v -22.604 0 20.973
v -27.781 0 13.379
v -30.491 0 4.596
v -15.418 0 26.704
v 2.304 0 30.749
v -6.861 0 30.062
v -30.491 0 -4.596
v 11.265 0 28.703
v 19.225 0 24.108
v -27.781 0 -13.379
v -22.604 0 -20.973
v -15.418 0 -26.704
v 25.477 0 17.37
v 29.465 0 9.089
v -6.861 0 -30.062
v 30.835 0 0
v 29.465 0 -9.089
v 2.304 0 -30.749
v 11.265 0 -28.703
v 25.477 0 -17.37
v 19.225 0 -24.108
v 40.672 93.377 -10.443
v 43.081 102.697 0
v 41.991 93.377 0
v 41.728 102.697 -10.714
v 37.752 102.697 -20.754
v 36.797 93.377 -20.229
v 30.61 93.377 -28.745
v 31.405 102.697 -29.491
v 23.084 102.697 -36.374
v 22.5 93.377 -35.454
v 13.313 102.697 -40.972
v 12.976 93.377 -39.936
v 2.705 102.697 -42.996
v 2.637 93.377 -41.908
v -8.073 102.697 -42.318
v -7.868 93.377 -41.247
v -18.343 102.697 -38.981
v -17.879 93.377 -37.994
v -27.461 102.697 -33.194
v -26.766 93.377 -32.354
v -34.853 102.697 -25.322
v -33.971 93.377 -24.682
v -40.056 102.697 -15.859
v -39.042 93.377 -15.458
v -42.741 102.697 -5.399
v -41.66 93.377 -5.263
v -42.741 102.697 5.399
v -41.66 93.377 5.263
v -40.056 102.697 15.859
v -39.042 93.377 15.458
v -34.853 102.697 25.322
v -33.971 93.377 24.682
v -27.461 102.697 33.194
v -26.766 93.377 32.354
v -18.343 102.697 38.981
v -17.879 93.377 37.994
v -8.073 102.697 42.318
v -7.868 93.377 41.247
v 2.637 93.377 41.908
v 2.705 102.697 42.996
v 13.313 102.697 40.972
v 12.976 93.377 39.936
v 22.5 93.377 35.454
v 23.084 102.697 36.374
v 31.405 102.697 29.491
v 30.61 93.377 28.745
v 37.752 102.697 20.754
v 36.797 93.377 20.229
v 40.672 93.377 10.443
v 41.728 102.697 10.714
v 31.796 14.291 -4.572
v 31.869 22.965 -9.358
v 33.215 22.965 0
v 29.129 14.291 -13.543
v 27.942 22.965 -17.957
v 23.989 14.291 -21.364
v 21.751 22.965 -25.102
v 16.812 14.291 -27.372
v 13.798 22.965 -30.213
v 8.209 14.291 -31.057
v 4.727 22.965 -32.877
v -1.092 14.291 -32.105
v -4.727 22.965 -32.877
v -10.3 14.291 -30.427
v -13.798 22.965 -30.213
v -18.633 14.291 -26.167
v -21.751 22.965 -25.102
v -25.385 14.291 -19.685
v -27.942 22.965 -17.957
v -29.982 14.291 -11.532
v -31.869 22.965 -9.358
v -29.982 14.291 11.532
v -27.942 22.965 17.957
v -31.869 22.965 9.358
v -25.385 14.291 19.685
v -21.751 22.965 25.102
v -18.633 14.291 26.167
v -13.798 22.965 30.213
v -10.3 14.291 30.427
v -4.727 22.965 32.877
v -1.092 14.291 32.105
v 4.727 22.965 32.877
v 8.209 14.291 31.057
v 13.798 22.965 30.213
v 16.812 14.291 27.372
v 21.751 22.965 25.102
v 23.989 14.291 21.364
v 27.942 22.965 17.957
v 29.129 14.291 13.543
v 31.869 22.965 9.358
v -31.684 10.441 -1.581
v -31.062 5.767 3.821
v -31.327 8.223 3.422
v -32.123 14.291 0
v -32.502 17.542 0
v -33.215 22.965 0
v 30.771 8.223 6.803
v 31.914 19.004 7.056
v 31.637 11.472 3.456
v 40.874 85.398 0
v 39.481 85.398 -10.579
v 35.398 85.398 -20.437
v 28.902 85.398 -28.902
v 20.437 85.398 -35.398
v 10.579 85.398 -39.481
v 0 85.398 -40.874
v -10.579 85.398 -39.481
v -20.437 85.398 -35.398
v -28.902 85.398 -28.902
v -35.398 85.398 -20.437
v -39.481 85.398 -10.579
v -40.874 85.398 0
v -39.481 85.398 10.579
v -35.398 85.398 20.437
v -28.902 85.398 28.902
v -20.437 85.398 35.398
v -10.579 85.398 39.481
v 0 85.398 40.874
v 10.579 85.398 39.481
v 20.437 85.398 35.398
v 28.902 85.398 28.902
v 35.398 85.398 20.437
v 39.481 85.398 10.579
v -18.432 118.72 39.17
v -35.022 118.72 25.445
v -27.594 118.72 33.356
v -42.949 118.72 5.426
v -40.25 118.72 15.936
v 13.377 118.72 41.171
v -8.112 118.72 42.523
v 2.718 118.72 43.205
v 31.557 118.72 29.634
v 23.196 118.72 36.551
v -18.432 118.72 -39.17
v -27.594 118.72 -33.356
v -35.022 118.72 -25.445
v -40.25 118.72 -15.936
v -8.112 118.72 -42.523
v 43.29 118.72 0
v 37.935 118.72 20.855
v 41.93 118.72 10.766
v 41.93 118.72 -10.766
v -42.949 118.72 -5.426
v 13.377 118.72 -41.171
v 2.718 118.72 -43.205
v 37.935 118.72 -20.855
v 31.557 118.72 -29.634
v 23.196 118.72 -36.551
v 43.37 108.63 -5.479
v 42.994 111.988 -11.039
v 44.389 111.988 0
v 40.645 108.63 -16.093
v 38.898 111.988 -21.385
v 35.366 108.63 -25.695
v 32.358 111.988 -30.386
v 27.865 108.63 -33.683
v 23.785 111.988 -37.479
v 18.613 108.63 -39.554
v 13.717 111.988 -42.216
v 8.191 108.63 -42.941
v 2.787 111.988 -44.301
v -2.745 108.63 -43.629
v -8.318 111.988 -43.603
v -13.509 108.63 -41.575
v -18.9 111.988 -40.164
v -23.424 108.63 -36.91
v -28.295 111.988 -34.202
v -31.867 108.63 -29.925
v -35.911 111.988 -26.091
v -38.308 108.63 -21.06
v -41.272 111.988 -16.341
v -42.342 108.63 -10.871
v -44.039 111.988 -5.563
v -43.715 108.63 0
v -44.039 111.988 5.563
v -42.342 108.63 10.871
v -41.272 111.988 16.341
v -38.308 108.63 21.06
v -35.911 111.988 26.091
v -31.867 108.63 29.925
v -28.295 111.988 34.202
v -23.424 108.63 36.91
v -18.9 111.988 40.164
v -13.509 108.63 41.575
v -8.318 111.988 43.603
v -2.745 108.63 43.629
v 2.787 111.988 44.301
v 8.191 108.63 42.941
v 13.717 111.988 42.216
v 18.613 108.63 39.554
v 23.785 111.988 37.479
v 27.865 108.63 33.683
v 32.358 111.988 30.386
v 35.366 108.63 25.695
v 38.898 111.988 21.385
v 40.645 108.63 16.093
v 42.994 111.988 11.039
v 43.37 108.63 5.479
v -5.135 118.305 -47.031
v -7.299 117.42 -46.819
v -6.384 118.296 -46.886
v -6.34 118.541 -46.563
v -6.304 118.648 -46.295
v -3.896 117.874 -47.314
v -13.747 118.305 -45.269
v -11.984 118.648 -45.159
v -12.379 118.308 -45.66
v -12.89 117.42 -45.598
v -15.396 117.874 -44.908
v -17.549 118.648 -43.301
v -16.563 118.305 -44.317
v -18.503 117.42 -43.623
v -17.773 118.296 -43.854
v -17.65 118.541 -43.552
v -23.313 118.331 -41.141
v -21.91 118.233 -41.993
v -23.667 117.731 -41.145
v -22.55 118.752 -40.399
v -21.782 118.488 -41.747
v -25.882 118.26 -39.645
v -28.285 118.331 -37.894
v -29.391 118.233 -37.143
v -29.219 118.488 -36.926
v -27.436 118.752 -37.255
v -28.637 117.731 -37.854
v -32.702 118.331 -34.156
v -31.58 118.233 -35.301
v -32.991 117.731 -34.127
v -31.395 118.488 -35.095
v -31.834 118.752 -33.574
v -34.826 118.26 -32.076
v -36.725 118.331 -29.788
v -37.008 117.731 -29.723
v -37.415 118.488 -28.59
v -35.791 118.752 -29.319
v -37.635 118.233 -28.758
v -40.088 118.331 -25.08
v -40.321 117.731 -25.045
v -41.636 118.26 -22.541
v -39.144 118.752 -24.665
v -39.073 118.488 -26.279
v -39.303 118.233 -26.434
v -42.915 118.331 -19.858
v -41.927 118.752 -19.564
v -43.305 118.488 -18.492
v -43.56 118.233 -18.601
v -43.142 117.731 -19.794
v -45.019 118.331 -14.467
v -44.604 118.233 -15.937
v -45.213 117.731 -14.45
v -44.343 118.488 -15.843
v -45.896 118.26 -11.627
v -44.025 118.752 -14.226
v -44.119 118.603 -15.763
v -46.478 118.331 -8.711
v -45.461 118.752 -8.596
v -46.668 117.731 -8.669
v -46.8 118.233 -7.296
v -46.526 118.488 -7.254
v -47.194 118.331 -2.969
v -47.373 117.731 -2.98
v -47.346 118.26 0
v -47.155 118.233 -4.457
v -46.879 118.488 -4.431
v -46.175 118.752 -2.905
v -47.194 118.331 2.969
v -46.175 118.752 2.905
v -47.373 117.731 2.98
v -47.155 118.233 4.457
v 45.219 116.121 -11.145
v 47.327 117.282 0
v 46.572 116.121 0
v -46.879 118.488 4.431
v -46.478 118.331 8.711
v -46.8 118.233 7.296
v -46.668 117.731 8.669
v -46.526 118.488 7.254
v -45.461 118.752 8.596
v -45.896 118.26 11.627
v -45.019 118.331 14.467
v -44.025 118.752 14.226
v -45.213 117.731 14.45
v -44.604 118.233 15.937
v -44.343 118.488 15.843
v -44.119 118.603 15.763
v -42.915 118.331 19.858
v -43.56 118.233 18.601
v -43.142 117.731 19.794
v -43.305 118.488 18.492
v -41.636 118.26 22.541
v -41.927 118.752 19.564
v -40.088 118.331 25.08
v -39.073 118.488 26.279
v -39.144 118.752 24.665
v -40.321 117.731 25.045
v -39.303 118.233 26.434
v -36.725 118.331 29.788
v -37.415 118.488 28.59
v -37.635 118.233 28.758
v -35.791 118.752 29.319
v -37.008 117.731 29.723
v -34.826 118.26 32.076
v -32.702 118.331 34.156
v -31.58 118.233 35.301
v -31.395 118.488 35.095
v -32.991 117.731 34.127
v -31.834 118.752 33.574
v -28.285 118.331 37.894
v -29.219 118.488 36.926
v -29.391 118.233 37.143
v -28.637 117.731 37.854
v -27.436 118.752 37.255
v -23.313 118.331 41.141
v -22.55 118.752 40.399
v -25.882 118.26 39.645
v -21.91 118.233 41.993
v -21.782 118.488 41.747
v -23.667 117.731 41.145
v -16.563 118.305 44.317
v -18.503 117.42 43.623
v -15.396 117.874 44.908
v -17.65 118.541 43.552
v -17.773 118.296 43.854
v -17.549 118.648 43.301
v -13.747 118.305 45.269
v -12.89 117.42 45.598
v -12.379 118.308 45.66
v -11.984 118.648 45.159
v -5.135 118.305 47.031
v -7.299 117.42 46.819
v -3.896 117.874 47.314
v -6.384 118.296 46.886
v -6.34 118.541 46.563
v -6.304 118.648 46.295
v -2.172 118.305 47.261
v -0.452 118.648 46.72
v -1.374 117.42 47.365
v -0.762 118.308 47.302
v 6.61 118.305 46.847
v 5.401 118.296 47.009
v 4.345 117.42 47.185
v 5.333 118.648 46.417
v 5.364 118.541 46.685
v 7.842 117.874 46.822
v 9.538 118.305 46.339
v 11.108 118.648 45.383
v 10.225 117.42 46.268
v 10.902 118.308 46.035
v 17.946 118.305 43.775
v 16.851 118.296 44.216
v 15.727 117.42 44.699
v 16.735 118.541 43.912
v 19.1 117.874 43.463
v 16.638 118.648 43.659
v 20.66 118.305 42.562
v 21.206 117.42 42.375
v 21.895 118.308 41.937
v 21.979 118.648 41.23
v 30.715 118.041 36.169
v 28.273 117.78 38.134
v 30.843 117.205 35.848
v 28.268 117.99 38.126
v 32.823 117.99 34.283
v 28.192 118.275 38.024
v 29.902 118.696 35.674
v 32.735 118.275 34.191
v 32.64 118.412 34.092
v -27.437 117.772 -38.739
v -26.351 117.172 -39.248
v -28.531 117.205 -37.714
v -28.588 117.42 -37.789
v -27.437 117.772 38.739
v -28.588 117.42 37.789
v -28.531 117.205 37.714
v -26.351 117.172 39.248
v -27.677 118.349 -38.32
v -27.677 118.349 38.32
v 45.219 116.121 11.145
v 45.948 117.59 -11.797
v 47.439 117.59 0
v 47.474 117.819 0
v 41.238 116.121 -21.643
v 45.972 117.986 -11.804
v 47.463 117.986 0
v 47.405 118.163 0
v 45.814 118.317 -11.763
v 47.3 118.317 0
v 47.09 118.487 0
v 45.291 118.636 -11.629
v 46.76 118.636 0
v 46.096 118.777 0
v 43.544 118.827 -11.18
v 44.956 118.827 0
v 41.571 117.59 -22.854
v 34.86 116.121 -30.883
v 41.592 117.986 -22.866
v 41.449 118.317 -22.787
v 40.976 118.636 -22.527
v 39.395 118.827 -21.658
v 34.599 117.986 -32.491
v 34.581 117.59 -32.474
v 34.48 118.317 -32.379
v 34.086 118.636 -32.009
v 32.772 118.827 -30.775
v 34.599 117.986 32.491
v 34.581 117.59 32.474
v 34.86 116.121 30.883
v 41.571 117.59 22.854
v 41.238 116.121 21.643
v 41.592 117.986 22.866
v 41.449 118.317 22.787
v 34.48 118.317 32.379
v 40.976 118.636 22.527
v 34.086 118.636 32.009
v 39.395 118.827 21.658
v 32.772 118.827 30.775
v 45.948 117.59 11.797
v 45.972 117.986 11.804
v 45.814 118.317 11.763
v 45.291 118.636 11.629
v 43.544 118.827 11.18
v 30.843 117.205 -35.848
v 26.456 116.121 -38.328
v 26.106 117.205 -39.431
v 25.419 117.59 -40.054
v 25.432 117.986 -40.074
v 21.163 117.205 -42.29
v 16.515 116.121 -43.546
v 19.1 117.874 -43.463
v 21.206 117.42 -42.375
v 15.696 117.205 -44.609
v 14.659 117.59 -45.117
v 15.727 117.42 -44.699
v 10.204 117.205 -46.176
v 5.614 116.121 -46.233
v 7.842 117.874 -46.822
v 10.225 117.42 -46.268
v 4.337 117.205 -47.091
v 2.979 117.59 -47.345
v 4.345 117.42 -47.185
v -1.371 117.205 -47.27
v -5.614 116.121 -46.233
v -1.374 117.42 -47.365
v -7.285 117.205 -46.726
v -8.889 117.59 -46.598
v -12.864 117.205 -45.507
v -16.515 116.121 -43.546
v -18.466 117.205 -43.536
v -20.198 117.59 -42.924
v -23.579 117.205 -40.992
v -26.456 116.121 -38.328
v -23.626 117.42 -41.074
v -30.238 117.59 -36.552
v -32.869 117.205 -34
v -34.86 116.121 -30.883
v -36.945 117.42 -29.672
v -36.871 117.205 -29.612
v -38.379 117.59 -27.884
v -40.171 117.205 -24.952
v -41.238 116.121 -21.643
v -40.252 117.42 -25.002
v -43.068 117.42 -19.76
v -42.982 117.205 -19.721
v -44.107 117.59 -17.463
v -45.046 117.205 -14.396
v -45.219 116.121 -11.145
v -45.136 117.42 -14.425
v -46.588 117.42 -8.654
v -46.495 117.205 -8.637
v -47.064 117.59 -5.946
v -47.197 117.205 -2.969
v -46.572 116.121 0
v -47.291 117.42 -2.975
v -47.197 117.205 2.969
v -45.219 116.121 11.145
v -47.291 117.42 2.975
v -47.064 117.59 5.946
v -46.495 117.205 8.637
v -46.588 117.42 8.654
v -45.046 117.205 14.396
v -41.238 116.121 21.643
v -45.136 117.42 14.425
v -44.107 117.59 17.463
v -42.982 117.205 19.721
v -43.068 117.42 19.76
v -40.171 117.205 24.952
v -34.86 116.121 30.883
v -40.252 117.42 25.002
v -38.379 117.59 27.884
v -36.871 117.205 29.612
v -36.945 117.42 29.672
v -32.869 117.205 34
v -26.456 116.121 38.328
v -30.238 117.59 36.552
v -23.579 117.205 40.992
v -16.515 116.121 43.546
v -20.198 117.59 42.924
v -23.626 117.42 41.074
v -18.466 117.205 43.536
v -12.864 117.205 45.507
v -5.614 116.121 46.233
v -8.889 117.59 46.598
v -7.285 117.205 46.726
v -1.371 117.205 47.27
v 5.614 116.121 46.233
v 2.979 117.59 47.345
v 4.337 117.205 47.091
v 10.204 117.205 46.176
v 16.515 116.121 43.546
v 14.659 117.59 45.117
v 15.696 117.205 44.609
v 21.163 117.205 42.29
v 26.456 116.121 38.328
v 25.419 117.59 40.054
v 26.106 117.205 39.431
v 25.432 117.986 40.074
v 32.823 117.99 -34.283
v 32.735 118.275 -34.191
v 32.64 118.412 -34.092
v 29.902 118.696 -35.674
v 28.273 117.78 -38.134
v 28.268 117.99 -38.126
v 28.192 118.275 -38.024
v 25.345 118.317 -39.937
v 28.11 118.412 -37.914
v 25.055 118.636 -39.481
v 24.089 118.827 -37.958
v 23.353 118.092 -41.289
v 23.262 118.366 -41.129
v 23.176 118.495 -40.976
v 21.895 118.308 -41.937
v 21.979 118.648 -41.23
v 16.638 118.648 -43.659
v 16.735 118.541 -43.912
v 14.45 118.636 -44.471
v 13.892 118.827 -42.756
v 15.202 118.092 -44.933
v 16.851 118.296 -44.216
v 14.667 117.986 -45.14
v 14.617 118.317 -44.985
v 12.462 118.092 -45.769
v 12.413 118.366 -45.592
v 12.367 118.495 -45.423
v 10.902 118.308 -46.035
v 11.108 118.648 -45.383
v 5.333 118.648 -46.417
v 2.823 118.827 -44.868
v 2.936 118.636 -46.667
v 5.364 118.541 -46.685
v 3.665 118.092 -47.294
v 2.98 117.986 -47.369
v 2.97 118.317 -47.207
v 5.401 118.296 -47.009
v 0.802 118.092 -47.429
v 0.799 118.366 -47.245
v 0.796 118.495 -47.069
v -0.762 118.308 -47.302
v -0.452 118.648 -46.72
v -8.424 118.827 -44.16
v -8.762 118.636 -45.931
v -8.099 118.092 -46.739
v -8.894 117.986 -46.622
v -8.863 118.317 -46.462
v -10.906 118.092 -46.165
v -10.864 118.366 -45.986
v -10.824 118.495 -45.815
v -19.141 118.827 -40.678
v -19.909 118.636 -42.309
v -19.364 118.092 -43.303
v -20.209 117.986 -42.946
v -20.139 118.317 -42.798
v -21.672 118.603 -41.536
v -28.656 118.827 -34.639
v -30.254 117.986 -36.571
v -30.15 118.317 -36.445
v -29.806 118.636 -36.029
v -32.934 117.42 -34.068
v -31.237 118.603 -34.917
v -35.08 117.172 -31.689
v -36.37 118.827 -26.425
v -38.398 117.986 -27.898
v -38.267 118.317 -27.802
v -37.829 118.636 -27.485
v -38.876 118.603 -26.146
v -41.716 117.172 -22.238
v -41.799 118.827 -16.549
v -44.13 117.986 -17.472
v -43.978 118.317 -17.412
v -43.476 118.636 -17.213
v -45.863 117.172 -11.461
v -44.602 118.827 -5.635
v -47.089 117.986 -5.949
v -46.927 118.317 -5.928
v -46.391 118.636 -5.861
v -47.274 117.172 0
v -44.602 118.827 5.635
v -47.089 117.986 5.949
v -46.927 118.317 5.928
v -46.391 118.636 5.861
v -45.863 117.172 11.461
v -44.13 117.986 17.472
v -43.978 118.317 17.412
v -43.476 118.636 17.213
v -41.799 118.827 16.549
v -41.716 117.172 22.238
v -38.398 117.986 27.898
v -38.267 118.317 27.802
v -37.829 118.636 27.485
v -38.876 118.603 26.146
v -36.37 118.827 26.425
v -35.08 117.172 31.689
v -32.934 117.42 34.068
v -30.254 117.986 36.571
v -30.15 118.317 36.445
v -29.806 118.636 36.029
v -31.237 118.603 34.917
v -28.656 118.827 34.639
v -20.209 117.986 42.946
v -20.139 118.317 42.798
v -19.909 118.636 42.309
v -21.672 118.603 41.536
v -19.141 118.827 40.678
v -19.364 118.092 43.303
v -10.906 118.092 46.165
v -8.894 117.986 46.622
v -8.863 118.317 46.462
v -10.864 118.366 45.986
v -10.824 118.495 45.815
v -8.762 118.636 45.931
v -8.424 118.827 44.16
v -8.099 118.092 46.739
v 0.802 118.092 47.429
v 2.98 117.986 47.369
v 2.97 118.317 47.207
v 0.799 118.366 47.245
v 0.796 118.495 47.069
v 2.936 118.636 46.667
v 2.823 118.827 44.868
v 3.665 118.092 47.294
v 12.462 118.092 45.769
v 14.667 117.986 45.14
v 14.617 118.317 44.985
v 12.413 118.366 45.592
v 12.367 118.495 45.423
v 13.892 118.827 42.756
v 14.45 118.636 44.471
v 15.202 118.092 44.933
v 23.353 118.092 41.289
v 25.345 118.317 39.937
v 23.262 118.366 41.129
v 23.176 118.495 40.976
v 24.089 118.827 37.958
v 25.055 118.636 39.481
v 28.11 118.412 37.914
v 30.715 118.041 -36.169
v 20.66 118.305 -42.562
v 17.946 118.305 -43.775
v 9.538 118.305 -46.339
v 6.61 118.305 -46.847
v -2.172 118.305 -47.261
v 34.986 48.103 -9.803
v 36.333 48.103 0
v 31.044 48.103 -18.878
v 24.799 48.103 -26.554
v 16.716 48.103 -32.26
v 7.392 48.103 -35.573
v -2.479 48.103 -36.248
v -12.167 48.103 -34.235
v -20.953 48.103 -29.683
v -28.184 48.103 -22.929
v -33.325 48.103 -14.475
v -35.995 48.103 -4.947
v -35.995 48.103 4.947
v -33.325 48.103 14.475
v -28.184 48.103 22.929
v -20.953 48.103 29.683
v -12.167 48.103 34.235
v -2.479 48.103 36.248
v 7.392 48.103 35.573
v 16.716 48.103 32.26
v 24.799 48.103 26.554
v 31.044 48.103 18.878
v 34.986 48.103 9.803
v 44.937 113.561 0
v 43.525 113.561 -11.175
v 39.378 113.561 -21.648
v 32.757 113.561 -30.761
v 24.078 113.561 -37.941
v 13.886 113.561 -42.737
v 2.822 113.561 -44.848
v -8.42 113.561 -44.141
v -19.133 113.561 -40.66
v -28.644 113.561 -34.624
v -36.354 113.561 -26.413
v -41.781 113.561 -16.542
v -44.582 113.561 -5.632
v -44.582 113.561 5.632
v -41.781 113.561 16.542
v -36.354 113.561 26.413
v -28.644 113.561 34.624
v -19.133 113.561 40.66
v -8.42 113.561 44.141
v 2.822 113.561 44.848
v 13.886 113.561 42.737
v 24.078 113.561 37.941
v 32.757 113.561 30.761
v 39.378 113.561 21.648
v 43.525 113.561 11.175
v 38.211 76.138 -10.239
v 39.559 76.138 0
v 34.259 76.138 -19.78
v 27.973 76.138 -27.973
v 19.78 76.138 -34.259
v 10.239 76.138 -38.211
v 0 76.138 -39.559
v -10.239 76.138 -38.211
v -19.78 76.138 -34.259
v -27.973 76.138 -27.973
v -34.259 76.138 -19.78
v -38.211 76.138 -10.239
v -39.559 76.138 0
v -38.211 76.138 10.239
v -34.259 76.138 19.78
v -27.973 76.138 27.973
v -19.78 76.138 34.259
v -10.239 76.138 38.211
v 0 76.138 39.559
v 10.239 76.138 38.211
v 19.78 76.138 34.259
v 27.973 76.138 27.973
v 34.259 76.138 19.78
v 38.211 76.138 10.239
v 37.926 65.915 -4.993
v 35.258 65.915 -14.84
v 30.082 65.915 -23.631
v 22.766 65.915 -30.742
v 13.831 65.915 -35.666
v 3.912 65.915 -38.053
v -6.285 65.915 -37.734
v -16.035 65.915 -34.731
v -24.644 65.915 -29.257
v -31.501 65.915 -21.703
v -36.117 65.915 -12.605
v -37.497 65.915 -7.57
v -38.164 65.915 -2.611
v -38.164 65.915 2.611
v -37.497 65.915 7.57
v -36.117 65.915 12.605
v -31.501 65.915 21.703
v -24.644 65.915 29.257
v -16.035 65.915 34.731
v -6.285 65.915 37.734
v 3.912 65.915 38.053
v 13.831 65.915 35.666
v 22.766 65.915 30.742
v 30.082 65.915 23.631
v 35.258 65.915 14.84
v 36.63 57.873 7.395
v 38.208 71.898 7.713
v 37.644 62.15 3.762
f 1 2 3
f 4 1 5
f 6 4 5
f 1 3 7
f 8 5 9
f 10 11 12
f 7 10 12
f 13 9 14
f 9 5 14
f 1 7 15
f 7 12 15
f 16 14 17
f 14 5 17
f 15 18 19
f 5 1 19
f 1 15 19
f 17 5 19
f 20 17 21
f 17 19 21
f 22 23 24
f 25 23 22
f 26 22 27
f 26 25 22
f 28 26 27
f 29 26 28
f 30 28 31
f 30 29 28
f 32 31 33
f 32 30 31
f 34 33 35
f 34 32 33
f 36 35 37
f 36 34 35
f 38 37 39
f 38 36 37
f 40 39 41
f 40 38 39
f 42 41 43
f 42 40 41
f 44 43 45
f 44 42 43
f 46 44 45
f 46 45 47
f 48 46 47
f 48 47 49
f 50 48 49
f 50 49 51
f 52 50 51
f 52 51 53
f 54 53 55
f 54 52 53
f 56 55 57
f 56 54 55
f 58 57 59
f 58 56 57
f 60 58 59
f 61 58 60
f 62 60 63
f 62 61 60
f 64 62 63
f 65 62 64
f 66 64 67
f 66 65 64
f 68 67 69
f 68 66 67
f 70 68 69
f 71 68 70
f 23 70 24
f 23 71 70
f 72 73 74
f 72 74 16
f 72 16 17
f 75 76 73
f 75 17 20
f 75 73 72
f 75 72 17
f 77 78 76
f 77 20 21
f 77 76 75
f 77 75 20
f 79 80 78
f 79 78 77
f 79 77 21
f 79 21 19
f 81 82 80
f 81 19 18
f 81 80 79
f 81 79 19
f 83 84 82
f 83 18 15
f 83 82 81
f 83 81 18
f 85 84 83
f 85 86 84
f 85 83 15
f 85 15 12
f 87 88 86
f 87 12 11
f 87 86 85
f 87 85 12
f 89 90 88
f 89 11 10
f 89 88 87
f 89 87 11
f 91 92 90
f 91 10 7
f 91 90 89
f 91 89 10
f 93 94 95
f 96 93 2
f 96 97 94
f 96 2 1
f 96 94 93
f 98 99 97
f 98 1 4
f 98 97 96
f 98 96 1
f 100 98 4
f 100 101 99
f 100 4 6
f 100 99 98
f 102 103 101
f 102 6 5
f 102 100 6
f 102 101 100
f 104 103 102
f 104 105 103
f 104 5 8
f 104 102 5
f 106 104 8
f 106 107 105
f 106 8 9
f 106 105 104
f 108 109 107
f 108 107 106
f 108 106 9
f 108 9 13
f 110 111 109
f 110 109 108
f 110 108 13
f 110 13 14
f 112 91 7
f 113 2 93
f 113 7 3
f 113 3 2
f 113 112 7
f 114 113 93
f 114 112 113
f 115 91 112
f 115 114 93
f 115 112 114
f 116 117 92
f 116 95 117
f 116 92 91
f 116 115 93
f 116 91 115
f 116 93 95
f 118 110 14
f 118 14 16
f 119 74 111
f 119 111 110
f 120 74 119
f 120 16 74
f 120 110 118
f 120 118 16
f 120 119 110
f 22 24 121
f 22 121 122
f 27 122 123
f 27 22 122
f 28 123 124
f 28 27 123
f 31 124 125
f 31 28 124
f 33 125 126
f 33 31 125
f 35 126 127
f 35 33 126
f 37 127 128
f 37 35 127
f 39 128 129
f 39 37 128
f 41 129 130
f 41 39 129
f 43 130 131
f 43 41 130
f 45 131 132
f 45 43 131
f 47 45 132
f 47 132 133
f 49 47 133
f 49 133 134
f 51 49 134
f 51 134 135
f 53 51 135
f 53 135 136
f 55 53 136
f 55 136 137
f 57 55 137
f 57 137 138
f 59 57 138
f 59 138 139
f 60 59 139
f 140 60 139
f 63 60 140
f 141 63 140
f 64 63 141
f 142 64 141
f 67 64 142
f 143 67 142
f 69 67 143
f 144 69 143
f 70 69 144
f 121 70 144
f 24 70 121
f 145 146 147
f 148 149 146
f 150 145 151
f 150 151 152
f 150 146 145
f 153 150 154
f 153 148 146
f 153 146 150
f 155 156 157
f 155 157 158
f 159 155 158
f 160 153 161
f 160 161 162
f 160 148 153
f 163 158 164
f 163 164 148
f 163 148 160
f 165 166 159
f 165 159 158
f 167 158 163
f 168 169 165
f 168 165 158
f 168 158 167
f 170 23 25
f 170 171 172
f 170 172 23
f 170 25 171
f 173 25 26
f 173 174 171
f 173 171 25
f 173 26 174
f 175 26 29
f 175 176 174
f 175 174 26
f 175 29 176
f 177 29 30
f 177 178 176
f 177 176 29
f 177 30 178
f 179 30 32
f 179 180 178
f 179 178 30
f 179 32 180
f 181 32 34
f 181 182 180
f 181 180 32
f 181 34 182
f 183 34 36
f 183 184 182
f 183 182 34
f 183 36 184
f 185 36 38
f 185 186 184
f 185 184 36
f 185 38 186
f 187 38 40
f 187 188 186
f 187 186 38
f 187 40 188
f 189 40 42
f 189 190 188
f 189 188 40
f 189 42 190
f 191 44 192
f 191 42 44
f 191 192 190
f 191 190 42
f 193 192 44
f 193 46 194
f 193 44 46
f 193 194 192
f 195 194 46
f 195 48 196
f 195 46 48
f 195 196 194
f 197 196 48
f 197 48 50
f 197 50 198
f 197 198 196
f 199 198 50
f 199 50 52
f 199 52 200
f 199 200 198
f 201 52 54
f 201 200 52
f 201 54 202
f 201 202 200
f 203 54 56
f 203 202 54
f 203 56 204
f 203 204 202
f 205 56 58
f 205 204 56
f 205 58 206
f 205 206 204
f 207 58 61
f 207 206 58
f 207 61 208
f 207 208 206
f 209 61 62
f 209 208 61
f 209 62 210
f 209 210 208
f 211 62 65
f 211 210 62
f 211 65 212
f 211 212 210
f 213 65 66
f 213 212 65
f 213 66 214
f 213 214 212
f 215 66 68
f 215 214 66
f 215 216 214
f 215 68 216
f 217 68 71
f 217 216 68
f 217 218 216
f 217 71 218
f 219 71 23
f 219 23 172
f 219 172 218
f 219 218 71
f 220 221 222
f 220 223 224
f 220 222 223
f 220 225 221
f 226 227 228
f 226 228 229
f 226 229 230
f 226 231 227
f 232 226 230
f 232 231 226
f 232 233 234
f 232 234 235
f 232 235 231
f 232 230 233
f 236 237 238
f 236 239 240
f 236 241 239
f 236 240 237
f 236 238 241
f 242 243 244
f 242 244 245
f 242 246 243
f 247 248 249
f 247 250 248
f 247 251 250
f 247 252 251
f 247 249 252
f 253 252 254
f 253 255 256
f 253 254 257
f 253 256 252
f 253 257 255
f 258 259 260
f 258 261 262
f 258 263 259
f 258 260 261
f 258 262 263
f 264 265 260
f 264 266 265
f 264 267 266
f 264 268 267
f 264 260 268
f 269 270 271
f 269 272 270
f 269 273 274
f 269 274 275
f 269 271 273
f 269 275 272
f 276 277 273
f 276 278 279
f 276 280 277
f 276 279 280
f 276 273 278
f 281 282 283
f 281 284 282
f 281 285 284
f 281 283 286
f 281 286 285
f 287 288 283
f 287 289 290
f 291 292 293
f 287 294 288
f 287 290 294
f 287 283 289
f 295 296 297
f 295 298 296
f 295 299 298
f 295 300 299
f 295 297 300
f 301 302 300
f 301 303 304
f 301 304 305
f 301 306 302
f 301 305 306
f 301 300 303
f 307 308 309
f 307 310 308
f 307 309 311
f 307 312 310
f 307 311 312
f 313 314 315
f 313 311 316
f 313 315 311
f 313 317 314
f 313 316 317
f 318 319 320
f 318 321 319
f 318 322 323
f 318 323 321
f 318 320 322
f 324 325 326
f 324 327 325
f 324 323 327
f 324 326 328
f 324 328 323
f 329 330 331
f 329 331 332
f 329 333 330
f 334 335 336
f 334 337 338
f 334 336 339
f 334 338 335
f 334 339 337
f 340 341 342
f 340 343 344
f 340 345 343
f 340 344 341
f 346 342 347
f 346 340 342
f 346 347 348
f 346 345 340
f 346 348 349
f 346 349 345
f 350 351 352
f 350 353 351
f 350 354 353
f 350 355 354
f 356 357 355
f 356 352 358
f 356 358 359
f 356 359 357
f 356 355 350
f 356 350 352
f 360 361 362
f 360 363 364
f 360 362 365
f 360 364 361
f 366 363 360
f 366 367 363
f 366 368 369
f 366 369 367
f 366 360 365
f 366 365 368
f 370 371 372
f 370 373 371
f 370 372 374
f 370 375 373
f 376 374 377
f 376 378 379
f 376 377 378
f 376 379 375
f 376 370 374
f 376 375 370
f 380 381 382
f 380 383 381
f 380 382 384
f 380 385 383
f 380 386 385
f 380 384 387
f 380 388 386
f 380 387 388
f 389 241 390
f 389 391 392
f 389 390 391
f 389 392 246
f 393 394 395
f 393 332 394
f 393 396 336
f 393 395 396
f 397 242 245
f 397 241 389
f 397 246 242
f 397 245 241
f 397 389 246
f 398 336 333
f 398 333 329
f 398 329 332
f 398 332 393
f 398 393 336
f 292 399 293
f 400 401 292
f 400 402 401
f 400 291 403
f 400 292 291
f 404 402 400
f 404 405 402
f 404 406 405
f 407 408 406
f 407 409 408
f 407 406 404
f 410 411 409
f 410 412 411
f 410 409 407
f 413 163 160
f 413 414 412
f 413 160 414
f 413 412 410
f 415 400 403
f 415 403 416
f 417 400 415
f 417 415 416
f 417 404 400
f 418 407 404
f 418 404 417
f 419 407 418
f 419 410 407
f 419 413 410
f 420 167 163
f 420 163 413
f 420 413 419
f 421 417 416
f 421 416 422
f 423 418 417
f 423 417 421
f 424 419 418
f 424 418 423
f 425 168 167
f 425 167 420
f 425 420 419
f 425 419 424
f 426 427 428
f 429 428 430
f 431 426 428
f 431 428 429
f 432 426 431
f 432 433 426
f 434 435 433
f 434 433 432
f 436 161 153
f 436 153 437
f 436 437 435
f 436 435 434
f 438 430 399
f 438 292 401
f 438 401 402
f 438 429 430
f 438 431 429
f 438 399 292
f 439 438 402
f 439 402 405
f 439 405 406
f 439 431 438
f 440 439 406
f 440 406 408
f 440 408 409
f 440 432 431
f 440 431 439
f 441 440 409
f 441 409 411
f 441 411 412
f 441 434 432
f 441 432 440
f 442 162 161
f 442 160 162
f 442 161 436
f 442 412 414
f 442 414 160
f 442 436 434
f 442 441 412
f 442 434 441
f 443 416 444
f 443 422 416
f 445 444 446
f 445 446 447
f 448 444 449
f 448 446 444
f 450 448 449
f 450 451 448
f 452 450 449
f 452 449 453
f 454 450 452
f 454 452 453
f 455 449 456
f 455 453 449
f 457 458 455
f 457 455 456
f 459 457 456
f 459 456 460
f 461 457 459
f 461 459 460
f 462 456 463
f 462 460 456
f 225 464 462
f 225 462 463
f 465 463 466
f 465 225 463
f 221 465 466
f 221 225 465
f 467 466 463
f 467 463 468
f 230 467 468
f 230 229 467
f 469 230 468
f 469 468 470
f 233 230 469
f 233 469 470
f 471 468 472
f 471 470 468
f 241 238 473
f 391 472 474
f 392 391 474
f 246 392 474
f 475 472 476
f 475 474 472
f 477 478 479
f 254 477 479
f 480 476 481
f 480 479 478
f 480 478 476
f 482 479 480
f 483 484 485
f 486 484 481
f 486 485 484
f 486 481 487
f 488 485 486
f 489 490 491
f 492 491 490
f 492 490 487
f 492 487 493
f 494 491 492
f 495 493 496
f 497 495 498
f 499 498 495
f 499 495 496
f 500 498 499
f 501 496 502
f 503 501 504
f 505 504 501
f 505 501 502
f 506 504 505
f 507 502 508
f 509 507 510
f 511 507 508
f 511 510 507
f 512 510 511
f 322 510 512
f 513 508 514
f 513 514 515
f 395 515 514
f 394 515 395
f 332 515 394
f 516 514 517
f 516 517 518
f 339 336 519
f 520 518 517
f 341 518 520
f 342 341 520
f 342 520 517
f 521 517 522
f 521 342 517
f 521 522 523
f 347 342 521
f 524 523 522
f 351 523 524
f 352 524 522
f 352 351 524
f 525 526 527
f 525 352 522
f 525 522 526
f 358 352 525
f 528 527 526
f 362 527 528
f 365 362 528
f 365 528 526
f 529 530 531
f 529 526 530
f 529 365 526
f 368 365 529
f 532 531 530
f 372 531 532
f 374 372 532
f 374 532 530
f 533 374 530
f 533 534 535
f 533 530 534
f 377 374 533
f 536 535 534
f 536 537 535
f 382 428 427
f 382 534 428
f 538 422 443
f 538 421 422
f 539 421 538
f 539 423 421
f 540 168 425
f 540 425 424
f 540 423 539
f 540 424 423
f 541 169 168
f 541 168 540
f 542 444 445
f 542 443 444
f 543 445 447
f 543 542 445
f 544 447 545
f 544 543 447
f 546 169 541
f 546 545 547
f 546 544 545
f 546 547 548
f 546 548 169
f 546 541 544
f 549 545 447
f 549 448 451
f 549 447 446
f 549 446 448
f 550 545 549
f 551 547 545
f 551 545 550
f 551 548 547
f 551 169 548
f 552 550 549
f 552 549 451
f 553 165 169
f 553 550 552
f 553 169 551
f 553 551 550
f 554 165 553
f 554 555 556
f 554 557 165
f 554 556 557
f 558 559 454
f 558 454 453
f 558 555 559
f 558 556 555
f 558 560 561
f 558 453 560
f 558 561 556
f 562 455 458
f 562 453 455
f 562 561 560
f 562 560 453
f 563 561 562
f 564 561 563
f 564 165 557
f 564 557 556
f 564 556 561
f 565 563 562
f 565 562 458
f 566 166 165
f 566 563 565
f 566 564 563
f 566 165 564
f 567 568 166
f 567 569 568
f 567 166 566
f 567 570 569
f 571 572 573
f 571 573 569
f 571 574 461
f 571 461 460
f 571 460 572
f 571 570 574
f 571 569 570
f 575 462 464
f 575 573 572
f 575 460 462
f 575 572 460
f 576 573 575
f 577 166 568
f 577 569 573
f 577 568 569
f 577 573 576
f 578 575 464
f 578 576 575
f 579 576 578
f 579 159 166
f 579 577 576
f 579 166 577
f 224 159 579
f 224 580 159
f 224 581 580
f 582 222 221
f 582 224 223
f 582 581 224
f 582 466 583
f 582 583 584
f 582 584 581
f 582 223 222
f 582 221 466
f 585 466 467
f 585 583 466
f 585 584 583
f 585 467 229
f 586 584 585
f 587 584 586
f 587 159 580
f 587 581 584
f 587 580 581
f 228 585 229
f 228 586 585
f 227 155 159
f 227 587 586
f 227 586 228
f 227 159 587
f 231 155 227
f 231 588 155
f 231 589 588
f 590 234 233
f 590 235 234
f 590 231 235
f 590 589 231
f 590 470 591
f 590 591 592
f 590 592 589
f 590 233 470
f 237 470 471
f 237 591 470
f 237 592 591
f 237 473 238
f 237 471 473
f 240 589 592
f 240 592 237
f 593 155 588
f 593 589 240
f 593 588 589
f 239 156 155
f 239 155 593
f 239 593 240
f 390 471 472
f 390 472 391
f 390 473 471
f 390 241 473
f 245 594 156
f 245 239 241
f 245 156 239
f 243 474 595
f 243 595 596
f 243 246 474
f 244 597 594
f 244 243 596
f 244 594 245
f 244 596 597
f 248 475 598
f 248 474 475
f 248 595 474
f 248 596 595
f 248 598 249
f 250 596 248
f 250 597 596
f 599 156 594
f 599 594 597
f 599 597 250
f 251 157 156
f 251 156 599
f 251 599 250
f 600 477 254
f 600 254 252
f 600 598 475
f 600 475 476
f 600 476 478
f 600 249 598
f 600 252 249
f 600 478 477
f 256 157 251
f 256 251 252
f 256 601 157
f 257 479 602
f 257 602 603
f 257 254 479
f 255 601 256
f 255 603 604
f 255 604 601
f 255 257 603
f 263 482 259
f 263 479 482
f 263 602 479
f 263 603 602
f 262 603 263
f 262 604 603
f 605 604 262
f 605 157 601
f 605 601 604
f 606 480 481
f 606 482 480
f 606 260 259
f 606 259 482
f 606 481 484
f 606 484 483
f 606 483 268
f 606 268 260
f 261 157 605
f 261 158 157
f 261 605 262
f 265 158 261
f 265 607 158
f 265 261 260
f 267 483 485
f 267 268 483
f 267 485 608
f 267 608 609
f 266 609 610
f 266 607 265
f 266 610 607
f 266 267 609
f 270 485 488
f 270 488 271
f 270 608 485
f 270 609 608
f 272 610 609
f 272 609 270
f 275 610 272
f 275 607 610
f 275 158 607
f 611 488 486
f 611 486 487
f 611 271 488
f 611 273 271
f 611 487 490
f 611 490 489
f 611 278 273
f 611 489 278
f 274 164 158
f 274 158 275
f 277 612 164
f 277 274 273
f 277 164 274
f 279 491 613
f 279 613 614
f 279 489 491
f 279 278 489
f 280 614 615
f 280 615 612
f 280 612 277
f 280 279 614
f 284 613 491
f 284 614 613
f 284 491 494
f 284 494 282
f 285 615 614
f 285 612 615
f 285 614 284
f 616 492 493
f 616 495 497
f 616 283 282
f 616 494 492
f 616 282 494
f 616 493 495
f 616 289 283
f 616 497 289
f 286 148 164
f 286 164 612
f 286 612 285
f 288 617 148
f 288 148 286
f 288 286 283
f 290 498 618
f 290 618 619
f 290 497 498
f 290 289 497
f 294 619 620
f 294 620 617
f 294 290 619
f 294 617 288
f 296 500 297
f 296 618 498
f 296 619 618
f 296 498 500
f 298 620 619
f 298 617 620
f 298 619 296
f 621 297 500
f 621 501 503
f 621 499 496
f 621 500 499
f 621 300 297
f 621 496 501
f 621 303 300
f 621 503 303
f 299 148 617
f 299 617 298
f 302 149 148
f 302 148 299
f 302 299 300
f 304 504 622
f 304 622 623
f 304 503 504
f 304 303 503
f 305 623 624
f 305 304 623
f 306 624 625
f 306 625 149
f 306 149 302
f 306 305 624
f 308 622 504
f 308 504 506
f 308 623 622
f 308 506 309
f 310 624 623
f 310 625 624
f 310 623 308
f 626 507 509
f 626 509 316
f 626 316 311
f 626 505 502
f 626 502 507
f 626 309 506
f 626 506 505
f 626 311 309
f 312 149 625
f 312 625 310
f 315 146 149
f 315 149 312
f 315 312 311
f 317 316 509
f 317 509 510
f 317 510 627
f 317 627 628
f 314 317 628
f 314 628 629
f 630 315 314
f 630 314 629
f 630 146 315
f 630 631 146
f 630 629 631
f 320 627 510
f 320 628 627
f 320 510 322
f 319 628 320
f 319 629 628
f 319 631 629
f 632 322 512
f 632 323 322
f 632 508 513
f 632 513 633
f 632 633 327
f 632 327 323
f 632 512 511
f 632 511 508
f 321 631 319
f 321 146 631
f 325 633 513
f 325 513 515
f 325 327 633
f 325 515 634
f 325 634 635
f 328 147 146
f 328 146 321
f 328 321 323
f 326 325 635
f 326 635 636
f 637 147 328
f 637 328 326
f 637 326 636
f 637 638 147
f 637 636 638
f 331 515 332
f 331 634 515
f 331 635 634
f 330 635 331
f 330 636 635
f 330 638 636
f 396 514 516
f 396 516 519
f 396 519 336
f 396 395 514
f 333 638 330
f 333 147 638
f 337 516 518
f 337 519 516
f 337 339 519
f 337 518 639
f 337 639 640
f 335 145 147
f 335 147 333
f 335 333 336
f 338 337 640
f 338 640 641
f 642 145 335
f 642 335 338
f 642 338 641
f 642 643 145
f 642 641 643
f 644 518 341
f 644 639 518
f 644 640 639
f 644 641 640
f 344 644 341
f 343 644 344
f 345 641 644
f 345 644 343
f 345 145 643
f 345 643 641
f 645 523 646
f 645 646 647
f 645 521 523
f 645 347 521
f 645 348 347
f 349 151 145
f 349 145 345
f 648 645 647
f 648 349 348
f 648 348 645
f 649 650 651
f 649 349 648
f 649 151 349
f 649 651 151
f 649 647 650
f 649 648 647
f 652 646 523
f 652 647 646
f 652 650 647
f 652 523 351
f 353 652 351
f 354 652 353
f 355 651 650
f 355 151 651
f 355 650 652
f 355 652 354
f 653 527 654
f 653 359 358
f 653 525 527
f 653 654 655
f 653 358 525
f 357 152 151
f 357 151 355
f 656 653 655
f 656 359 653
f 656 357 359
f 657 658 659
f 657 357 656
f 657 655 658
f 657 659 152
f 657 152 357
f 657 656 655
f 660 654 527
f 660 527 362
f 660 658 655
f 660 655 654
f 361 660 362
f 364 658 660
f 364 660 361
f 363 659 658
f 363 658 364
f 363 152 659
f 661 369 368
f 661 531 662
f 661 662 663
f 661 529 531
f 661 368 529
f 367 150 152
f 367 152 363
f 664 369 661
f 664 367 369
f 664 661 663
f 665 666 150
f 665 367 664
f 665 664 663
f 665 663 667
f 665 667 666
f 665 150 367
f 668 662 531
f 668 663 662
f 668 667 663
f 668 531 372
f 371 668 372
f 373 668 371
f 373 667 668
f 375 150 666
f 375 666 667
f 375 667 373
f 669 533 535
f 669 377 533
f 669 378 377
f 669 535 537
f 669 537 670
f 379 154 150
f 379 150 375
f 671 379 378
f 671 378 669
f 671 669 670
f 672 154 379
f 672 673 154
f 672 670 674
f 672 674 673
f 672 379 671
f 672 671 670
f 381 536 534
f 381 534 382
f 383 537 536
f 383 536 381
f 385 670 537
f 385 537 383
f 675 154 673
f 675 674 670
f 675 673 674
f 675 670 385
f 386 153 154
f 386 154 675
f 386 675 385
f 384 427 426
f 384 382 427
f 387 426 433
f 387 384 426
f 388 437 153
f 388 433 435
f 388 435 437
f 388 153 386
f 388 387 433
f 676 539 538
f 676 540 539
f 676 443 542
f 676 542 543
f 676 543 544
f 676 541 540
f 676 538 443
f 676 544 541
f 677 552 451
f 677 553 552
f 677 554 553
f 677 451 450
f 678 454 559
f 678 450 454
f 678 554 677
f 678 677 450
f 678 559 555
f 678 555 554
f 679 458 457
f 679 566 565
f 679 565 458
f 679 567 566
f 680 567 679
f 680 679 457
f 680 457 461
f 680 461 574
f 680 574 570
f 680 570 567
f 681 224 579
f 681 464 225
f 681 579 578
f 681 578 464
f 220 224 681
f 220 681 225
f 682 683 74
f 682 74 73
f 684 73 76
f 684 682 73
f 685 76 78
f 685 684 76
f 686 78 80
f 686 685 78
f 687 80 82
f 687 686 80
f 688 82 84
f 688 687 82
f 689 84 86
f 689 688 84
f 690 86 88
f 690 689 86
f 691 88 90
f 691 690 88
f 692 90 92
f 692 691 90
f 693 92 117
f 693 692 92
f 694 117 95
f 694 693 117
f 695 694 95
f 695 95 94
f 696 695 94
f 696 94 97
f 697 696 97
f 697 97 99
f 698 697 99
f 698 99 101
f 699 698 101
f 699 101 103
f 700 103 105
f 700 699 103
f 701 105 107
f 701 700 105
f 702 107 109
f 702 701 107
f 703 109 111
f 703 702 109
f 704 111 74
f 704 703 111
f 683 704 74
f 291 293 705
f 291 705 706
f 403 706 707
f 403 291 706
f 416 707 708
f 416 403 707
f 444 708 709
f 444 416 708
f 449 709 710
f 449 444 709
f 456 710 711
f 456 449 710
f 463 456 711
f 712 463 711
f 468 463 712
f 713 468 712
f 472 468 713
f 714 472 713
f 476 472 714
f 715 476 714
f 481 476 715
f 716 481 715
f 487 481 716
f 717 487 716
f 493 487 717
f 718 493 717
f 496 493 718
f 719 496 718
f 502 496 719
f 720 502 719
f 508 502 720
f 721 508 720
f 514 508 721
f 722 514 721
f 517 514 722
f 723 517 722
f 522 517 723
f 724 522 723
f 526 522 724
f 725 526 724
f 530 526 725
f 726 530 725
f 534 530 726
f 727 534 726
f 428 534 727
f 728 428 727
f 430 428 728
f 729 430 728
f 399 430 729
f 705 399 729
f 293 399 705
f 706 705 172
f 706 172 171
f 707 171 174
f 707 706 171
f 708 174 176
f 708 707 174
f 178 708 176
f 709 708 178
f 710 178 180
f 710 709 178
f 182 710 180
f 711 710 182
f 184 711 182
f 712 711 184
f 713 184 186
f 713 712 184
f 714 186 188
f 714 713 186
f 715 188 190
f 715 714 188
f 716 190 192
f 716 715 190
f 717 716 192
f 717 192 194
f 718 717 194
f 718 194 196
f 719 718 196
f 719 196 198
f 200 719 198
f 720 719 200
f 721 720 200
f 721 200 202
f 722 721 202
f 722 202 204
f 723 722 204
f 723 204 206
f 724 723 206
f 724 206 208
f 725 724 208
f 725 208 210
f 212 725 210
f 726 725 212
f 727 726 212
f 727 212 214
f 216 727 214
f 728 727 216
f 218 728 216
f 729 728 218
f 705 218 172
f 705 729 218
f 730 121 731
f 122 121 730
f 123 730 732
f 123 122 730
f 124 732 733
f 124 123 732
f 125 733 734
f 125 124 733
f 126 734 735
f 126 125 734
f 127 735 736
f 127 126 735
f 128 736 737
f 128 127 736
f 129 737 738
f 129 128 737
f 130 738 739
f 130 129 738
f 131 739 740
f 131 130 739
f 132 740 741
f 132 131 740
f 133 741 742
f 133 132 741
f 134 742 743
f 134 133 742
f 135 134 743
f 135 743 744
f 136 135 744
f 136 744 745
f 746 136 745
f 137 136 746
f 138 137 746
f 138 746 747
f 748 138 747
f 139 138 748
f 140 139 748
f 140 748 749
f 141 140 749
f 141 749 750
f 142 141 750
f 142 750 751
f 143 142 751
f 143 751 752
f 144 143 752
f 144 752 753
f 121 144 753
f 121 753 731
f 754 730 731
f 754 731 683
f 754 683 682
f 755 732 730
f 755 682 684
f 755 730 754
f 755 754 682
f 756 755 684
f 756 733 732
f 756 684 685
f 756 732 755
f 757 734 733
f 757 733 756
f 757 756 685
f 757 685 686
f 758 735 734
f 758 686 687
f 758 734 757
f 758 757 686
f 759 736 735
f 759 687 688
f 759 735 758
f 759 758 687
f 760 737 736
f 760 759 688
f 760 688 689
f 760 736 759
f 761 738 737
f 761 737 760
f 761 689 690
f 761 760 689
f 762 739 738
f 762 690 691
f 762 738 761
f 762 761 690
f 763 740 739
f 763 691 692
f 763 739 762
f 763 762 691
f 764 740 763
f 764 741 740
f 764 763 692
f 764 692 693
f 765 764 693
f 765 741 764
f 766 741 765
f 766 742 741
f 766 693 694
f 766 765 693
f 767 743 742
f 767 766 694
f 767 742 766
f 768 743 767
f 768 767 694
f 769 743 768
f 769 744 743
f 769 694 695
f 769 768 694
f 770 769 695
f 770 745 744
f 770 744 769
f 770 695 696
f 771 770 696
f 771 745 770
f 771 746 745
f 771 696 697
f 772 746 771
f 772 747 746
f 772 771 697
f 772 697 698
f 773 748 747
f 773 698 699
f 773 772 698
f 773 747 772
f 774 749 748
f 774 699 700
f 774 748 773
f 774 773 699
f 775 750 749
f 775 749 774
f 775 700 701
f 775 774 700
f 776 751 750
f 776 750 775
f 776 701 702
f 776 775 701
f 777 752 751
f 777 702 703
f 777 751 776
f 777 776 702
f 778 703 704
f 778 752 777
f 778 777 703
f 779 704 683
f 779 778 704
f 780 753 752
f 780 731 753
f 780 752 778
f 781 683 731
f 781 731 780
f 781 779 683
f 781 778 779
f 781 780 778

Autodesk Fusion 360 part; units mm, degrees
sketch "Sketch1" plane through (0, 0, 0) normal (0, 0, 1) x (1, 0, 0)
  line L0 (0, 0) -> (0, 118.72)
  line L1 (0, 118.72) -> (43.29, 118.72)
  line L2 (0, 0) -> (30.835, 0)
  line L3 (30.835, 0) -> (32.4827, 21.9582)
  line L4 (32.4827, 21.9582) -> (34.5239, 24.7657)
  line L5 (34.5239, 24.7657) -> (38.4107, 74.9013)
  line L6 (38.4107, 74.9013) -> (40.3708, 77.0121)
  line L7 (40.3708, 77.0121) -> (41.2754, 92.0891)
  line L8 (41.2754, 92.0891) -> (42.7831, 94.8029)
  line L9 (42.7831, 94.8029) -> (43.3862, 110.7846)
  line L10 (43.3862, 110.7846) -> (44.8939, 112.5938)
  line L11 (44.8939, 112.5938) -> (45, 115)
  line L12 (45, 115) -> (47.7585, 116.9661)
  line L13 (47.7585, 116.9661) -> (48.2108, 119.2277)
  line L14 (48.2108, 119.2277) -> (43.29, 118.72)
  spline S0 degree 5 poles (30.835, 0) (32.4827, 21.9582) (34.5239, 24.7657) (38.4107, 74.9013) (40.3708, 77.0121) (41.2754, 92.0891) (42.7831, 94.8029) (43.3862, 110.7846) (44.8939, 112.5938) (45, 115) (47.7585, 116.9661) (48.2108, 119.2277) (43.29, 118.72) knots 0 0 0 0 0 0 0.125 0.25 0.375 0.5 0.625 0.75 0.875 1 1 1 1 1 1
  dimension "d1" = 118.72
  dimension "d2" = 43.29
  dimension "d3" = 30.835
revolve "Revolve1" add sketch "Sketch1" angle 360 about axis through (0, 0, 0) along (0, 1, 0) contours L0 L1 L2 L3 L4 L5 L6 L7 L8 L9 L10 L11 L12 S0 | L3 L4 S0 | L11 L12 S0 | L5 L6 S0 | L9 L10 S0 | L7 L8 S0
shell "Shell1" thickness 2.3 removed faces 1 at (-9.4996, 118.72, -7.9471)
equation "d2 = ( 86.58 / 2 ) * 1 mm"
equation "d3 = ( 61.67 / 2 ) * 1 mm"
